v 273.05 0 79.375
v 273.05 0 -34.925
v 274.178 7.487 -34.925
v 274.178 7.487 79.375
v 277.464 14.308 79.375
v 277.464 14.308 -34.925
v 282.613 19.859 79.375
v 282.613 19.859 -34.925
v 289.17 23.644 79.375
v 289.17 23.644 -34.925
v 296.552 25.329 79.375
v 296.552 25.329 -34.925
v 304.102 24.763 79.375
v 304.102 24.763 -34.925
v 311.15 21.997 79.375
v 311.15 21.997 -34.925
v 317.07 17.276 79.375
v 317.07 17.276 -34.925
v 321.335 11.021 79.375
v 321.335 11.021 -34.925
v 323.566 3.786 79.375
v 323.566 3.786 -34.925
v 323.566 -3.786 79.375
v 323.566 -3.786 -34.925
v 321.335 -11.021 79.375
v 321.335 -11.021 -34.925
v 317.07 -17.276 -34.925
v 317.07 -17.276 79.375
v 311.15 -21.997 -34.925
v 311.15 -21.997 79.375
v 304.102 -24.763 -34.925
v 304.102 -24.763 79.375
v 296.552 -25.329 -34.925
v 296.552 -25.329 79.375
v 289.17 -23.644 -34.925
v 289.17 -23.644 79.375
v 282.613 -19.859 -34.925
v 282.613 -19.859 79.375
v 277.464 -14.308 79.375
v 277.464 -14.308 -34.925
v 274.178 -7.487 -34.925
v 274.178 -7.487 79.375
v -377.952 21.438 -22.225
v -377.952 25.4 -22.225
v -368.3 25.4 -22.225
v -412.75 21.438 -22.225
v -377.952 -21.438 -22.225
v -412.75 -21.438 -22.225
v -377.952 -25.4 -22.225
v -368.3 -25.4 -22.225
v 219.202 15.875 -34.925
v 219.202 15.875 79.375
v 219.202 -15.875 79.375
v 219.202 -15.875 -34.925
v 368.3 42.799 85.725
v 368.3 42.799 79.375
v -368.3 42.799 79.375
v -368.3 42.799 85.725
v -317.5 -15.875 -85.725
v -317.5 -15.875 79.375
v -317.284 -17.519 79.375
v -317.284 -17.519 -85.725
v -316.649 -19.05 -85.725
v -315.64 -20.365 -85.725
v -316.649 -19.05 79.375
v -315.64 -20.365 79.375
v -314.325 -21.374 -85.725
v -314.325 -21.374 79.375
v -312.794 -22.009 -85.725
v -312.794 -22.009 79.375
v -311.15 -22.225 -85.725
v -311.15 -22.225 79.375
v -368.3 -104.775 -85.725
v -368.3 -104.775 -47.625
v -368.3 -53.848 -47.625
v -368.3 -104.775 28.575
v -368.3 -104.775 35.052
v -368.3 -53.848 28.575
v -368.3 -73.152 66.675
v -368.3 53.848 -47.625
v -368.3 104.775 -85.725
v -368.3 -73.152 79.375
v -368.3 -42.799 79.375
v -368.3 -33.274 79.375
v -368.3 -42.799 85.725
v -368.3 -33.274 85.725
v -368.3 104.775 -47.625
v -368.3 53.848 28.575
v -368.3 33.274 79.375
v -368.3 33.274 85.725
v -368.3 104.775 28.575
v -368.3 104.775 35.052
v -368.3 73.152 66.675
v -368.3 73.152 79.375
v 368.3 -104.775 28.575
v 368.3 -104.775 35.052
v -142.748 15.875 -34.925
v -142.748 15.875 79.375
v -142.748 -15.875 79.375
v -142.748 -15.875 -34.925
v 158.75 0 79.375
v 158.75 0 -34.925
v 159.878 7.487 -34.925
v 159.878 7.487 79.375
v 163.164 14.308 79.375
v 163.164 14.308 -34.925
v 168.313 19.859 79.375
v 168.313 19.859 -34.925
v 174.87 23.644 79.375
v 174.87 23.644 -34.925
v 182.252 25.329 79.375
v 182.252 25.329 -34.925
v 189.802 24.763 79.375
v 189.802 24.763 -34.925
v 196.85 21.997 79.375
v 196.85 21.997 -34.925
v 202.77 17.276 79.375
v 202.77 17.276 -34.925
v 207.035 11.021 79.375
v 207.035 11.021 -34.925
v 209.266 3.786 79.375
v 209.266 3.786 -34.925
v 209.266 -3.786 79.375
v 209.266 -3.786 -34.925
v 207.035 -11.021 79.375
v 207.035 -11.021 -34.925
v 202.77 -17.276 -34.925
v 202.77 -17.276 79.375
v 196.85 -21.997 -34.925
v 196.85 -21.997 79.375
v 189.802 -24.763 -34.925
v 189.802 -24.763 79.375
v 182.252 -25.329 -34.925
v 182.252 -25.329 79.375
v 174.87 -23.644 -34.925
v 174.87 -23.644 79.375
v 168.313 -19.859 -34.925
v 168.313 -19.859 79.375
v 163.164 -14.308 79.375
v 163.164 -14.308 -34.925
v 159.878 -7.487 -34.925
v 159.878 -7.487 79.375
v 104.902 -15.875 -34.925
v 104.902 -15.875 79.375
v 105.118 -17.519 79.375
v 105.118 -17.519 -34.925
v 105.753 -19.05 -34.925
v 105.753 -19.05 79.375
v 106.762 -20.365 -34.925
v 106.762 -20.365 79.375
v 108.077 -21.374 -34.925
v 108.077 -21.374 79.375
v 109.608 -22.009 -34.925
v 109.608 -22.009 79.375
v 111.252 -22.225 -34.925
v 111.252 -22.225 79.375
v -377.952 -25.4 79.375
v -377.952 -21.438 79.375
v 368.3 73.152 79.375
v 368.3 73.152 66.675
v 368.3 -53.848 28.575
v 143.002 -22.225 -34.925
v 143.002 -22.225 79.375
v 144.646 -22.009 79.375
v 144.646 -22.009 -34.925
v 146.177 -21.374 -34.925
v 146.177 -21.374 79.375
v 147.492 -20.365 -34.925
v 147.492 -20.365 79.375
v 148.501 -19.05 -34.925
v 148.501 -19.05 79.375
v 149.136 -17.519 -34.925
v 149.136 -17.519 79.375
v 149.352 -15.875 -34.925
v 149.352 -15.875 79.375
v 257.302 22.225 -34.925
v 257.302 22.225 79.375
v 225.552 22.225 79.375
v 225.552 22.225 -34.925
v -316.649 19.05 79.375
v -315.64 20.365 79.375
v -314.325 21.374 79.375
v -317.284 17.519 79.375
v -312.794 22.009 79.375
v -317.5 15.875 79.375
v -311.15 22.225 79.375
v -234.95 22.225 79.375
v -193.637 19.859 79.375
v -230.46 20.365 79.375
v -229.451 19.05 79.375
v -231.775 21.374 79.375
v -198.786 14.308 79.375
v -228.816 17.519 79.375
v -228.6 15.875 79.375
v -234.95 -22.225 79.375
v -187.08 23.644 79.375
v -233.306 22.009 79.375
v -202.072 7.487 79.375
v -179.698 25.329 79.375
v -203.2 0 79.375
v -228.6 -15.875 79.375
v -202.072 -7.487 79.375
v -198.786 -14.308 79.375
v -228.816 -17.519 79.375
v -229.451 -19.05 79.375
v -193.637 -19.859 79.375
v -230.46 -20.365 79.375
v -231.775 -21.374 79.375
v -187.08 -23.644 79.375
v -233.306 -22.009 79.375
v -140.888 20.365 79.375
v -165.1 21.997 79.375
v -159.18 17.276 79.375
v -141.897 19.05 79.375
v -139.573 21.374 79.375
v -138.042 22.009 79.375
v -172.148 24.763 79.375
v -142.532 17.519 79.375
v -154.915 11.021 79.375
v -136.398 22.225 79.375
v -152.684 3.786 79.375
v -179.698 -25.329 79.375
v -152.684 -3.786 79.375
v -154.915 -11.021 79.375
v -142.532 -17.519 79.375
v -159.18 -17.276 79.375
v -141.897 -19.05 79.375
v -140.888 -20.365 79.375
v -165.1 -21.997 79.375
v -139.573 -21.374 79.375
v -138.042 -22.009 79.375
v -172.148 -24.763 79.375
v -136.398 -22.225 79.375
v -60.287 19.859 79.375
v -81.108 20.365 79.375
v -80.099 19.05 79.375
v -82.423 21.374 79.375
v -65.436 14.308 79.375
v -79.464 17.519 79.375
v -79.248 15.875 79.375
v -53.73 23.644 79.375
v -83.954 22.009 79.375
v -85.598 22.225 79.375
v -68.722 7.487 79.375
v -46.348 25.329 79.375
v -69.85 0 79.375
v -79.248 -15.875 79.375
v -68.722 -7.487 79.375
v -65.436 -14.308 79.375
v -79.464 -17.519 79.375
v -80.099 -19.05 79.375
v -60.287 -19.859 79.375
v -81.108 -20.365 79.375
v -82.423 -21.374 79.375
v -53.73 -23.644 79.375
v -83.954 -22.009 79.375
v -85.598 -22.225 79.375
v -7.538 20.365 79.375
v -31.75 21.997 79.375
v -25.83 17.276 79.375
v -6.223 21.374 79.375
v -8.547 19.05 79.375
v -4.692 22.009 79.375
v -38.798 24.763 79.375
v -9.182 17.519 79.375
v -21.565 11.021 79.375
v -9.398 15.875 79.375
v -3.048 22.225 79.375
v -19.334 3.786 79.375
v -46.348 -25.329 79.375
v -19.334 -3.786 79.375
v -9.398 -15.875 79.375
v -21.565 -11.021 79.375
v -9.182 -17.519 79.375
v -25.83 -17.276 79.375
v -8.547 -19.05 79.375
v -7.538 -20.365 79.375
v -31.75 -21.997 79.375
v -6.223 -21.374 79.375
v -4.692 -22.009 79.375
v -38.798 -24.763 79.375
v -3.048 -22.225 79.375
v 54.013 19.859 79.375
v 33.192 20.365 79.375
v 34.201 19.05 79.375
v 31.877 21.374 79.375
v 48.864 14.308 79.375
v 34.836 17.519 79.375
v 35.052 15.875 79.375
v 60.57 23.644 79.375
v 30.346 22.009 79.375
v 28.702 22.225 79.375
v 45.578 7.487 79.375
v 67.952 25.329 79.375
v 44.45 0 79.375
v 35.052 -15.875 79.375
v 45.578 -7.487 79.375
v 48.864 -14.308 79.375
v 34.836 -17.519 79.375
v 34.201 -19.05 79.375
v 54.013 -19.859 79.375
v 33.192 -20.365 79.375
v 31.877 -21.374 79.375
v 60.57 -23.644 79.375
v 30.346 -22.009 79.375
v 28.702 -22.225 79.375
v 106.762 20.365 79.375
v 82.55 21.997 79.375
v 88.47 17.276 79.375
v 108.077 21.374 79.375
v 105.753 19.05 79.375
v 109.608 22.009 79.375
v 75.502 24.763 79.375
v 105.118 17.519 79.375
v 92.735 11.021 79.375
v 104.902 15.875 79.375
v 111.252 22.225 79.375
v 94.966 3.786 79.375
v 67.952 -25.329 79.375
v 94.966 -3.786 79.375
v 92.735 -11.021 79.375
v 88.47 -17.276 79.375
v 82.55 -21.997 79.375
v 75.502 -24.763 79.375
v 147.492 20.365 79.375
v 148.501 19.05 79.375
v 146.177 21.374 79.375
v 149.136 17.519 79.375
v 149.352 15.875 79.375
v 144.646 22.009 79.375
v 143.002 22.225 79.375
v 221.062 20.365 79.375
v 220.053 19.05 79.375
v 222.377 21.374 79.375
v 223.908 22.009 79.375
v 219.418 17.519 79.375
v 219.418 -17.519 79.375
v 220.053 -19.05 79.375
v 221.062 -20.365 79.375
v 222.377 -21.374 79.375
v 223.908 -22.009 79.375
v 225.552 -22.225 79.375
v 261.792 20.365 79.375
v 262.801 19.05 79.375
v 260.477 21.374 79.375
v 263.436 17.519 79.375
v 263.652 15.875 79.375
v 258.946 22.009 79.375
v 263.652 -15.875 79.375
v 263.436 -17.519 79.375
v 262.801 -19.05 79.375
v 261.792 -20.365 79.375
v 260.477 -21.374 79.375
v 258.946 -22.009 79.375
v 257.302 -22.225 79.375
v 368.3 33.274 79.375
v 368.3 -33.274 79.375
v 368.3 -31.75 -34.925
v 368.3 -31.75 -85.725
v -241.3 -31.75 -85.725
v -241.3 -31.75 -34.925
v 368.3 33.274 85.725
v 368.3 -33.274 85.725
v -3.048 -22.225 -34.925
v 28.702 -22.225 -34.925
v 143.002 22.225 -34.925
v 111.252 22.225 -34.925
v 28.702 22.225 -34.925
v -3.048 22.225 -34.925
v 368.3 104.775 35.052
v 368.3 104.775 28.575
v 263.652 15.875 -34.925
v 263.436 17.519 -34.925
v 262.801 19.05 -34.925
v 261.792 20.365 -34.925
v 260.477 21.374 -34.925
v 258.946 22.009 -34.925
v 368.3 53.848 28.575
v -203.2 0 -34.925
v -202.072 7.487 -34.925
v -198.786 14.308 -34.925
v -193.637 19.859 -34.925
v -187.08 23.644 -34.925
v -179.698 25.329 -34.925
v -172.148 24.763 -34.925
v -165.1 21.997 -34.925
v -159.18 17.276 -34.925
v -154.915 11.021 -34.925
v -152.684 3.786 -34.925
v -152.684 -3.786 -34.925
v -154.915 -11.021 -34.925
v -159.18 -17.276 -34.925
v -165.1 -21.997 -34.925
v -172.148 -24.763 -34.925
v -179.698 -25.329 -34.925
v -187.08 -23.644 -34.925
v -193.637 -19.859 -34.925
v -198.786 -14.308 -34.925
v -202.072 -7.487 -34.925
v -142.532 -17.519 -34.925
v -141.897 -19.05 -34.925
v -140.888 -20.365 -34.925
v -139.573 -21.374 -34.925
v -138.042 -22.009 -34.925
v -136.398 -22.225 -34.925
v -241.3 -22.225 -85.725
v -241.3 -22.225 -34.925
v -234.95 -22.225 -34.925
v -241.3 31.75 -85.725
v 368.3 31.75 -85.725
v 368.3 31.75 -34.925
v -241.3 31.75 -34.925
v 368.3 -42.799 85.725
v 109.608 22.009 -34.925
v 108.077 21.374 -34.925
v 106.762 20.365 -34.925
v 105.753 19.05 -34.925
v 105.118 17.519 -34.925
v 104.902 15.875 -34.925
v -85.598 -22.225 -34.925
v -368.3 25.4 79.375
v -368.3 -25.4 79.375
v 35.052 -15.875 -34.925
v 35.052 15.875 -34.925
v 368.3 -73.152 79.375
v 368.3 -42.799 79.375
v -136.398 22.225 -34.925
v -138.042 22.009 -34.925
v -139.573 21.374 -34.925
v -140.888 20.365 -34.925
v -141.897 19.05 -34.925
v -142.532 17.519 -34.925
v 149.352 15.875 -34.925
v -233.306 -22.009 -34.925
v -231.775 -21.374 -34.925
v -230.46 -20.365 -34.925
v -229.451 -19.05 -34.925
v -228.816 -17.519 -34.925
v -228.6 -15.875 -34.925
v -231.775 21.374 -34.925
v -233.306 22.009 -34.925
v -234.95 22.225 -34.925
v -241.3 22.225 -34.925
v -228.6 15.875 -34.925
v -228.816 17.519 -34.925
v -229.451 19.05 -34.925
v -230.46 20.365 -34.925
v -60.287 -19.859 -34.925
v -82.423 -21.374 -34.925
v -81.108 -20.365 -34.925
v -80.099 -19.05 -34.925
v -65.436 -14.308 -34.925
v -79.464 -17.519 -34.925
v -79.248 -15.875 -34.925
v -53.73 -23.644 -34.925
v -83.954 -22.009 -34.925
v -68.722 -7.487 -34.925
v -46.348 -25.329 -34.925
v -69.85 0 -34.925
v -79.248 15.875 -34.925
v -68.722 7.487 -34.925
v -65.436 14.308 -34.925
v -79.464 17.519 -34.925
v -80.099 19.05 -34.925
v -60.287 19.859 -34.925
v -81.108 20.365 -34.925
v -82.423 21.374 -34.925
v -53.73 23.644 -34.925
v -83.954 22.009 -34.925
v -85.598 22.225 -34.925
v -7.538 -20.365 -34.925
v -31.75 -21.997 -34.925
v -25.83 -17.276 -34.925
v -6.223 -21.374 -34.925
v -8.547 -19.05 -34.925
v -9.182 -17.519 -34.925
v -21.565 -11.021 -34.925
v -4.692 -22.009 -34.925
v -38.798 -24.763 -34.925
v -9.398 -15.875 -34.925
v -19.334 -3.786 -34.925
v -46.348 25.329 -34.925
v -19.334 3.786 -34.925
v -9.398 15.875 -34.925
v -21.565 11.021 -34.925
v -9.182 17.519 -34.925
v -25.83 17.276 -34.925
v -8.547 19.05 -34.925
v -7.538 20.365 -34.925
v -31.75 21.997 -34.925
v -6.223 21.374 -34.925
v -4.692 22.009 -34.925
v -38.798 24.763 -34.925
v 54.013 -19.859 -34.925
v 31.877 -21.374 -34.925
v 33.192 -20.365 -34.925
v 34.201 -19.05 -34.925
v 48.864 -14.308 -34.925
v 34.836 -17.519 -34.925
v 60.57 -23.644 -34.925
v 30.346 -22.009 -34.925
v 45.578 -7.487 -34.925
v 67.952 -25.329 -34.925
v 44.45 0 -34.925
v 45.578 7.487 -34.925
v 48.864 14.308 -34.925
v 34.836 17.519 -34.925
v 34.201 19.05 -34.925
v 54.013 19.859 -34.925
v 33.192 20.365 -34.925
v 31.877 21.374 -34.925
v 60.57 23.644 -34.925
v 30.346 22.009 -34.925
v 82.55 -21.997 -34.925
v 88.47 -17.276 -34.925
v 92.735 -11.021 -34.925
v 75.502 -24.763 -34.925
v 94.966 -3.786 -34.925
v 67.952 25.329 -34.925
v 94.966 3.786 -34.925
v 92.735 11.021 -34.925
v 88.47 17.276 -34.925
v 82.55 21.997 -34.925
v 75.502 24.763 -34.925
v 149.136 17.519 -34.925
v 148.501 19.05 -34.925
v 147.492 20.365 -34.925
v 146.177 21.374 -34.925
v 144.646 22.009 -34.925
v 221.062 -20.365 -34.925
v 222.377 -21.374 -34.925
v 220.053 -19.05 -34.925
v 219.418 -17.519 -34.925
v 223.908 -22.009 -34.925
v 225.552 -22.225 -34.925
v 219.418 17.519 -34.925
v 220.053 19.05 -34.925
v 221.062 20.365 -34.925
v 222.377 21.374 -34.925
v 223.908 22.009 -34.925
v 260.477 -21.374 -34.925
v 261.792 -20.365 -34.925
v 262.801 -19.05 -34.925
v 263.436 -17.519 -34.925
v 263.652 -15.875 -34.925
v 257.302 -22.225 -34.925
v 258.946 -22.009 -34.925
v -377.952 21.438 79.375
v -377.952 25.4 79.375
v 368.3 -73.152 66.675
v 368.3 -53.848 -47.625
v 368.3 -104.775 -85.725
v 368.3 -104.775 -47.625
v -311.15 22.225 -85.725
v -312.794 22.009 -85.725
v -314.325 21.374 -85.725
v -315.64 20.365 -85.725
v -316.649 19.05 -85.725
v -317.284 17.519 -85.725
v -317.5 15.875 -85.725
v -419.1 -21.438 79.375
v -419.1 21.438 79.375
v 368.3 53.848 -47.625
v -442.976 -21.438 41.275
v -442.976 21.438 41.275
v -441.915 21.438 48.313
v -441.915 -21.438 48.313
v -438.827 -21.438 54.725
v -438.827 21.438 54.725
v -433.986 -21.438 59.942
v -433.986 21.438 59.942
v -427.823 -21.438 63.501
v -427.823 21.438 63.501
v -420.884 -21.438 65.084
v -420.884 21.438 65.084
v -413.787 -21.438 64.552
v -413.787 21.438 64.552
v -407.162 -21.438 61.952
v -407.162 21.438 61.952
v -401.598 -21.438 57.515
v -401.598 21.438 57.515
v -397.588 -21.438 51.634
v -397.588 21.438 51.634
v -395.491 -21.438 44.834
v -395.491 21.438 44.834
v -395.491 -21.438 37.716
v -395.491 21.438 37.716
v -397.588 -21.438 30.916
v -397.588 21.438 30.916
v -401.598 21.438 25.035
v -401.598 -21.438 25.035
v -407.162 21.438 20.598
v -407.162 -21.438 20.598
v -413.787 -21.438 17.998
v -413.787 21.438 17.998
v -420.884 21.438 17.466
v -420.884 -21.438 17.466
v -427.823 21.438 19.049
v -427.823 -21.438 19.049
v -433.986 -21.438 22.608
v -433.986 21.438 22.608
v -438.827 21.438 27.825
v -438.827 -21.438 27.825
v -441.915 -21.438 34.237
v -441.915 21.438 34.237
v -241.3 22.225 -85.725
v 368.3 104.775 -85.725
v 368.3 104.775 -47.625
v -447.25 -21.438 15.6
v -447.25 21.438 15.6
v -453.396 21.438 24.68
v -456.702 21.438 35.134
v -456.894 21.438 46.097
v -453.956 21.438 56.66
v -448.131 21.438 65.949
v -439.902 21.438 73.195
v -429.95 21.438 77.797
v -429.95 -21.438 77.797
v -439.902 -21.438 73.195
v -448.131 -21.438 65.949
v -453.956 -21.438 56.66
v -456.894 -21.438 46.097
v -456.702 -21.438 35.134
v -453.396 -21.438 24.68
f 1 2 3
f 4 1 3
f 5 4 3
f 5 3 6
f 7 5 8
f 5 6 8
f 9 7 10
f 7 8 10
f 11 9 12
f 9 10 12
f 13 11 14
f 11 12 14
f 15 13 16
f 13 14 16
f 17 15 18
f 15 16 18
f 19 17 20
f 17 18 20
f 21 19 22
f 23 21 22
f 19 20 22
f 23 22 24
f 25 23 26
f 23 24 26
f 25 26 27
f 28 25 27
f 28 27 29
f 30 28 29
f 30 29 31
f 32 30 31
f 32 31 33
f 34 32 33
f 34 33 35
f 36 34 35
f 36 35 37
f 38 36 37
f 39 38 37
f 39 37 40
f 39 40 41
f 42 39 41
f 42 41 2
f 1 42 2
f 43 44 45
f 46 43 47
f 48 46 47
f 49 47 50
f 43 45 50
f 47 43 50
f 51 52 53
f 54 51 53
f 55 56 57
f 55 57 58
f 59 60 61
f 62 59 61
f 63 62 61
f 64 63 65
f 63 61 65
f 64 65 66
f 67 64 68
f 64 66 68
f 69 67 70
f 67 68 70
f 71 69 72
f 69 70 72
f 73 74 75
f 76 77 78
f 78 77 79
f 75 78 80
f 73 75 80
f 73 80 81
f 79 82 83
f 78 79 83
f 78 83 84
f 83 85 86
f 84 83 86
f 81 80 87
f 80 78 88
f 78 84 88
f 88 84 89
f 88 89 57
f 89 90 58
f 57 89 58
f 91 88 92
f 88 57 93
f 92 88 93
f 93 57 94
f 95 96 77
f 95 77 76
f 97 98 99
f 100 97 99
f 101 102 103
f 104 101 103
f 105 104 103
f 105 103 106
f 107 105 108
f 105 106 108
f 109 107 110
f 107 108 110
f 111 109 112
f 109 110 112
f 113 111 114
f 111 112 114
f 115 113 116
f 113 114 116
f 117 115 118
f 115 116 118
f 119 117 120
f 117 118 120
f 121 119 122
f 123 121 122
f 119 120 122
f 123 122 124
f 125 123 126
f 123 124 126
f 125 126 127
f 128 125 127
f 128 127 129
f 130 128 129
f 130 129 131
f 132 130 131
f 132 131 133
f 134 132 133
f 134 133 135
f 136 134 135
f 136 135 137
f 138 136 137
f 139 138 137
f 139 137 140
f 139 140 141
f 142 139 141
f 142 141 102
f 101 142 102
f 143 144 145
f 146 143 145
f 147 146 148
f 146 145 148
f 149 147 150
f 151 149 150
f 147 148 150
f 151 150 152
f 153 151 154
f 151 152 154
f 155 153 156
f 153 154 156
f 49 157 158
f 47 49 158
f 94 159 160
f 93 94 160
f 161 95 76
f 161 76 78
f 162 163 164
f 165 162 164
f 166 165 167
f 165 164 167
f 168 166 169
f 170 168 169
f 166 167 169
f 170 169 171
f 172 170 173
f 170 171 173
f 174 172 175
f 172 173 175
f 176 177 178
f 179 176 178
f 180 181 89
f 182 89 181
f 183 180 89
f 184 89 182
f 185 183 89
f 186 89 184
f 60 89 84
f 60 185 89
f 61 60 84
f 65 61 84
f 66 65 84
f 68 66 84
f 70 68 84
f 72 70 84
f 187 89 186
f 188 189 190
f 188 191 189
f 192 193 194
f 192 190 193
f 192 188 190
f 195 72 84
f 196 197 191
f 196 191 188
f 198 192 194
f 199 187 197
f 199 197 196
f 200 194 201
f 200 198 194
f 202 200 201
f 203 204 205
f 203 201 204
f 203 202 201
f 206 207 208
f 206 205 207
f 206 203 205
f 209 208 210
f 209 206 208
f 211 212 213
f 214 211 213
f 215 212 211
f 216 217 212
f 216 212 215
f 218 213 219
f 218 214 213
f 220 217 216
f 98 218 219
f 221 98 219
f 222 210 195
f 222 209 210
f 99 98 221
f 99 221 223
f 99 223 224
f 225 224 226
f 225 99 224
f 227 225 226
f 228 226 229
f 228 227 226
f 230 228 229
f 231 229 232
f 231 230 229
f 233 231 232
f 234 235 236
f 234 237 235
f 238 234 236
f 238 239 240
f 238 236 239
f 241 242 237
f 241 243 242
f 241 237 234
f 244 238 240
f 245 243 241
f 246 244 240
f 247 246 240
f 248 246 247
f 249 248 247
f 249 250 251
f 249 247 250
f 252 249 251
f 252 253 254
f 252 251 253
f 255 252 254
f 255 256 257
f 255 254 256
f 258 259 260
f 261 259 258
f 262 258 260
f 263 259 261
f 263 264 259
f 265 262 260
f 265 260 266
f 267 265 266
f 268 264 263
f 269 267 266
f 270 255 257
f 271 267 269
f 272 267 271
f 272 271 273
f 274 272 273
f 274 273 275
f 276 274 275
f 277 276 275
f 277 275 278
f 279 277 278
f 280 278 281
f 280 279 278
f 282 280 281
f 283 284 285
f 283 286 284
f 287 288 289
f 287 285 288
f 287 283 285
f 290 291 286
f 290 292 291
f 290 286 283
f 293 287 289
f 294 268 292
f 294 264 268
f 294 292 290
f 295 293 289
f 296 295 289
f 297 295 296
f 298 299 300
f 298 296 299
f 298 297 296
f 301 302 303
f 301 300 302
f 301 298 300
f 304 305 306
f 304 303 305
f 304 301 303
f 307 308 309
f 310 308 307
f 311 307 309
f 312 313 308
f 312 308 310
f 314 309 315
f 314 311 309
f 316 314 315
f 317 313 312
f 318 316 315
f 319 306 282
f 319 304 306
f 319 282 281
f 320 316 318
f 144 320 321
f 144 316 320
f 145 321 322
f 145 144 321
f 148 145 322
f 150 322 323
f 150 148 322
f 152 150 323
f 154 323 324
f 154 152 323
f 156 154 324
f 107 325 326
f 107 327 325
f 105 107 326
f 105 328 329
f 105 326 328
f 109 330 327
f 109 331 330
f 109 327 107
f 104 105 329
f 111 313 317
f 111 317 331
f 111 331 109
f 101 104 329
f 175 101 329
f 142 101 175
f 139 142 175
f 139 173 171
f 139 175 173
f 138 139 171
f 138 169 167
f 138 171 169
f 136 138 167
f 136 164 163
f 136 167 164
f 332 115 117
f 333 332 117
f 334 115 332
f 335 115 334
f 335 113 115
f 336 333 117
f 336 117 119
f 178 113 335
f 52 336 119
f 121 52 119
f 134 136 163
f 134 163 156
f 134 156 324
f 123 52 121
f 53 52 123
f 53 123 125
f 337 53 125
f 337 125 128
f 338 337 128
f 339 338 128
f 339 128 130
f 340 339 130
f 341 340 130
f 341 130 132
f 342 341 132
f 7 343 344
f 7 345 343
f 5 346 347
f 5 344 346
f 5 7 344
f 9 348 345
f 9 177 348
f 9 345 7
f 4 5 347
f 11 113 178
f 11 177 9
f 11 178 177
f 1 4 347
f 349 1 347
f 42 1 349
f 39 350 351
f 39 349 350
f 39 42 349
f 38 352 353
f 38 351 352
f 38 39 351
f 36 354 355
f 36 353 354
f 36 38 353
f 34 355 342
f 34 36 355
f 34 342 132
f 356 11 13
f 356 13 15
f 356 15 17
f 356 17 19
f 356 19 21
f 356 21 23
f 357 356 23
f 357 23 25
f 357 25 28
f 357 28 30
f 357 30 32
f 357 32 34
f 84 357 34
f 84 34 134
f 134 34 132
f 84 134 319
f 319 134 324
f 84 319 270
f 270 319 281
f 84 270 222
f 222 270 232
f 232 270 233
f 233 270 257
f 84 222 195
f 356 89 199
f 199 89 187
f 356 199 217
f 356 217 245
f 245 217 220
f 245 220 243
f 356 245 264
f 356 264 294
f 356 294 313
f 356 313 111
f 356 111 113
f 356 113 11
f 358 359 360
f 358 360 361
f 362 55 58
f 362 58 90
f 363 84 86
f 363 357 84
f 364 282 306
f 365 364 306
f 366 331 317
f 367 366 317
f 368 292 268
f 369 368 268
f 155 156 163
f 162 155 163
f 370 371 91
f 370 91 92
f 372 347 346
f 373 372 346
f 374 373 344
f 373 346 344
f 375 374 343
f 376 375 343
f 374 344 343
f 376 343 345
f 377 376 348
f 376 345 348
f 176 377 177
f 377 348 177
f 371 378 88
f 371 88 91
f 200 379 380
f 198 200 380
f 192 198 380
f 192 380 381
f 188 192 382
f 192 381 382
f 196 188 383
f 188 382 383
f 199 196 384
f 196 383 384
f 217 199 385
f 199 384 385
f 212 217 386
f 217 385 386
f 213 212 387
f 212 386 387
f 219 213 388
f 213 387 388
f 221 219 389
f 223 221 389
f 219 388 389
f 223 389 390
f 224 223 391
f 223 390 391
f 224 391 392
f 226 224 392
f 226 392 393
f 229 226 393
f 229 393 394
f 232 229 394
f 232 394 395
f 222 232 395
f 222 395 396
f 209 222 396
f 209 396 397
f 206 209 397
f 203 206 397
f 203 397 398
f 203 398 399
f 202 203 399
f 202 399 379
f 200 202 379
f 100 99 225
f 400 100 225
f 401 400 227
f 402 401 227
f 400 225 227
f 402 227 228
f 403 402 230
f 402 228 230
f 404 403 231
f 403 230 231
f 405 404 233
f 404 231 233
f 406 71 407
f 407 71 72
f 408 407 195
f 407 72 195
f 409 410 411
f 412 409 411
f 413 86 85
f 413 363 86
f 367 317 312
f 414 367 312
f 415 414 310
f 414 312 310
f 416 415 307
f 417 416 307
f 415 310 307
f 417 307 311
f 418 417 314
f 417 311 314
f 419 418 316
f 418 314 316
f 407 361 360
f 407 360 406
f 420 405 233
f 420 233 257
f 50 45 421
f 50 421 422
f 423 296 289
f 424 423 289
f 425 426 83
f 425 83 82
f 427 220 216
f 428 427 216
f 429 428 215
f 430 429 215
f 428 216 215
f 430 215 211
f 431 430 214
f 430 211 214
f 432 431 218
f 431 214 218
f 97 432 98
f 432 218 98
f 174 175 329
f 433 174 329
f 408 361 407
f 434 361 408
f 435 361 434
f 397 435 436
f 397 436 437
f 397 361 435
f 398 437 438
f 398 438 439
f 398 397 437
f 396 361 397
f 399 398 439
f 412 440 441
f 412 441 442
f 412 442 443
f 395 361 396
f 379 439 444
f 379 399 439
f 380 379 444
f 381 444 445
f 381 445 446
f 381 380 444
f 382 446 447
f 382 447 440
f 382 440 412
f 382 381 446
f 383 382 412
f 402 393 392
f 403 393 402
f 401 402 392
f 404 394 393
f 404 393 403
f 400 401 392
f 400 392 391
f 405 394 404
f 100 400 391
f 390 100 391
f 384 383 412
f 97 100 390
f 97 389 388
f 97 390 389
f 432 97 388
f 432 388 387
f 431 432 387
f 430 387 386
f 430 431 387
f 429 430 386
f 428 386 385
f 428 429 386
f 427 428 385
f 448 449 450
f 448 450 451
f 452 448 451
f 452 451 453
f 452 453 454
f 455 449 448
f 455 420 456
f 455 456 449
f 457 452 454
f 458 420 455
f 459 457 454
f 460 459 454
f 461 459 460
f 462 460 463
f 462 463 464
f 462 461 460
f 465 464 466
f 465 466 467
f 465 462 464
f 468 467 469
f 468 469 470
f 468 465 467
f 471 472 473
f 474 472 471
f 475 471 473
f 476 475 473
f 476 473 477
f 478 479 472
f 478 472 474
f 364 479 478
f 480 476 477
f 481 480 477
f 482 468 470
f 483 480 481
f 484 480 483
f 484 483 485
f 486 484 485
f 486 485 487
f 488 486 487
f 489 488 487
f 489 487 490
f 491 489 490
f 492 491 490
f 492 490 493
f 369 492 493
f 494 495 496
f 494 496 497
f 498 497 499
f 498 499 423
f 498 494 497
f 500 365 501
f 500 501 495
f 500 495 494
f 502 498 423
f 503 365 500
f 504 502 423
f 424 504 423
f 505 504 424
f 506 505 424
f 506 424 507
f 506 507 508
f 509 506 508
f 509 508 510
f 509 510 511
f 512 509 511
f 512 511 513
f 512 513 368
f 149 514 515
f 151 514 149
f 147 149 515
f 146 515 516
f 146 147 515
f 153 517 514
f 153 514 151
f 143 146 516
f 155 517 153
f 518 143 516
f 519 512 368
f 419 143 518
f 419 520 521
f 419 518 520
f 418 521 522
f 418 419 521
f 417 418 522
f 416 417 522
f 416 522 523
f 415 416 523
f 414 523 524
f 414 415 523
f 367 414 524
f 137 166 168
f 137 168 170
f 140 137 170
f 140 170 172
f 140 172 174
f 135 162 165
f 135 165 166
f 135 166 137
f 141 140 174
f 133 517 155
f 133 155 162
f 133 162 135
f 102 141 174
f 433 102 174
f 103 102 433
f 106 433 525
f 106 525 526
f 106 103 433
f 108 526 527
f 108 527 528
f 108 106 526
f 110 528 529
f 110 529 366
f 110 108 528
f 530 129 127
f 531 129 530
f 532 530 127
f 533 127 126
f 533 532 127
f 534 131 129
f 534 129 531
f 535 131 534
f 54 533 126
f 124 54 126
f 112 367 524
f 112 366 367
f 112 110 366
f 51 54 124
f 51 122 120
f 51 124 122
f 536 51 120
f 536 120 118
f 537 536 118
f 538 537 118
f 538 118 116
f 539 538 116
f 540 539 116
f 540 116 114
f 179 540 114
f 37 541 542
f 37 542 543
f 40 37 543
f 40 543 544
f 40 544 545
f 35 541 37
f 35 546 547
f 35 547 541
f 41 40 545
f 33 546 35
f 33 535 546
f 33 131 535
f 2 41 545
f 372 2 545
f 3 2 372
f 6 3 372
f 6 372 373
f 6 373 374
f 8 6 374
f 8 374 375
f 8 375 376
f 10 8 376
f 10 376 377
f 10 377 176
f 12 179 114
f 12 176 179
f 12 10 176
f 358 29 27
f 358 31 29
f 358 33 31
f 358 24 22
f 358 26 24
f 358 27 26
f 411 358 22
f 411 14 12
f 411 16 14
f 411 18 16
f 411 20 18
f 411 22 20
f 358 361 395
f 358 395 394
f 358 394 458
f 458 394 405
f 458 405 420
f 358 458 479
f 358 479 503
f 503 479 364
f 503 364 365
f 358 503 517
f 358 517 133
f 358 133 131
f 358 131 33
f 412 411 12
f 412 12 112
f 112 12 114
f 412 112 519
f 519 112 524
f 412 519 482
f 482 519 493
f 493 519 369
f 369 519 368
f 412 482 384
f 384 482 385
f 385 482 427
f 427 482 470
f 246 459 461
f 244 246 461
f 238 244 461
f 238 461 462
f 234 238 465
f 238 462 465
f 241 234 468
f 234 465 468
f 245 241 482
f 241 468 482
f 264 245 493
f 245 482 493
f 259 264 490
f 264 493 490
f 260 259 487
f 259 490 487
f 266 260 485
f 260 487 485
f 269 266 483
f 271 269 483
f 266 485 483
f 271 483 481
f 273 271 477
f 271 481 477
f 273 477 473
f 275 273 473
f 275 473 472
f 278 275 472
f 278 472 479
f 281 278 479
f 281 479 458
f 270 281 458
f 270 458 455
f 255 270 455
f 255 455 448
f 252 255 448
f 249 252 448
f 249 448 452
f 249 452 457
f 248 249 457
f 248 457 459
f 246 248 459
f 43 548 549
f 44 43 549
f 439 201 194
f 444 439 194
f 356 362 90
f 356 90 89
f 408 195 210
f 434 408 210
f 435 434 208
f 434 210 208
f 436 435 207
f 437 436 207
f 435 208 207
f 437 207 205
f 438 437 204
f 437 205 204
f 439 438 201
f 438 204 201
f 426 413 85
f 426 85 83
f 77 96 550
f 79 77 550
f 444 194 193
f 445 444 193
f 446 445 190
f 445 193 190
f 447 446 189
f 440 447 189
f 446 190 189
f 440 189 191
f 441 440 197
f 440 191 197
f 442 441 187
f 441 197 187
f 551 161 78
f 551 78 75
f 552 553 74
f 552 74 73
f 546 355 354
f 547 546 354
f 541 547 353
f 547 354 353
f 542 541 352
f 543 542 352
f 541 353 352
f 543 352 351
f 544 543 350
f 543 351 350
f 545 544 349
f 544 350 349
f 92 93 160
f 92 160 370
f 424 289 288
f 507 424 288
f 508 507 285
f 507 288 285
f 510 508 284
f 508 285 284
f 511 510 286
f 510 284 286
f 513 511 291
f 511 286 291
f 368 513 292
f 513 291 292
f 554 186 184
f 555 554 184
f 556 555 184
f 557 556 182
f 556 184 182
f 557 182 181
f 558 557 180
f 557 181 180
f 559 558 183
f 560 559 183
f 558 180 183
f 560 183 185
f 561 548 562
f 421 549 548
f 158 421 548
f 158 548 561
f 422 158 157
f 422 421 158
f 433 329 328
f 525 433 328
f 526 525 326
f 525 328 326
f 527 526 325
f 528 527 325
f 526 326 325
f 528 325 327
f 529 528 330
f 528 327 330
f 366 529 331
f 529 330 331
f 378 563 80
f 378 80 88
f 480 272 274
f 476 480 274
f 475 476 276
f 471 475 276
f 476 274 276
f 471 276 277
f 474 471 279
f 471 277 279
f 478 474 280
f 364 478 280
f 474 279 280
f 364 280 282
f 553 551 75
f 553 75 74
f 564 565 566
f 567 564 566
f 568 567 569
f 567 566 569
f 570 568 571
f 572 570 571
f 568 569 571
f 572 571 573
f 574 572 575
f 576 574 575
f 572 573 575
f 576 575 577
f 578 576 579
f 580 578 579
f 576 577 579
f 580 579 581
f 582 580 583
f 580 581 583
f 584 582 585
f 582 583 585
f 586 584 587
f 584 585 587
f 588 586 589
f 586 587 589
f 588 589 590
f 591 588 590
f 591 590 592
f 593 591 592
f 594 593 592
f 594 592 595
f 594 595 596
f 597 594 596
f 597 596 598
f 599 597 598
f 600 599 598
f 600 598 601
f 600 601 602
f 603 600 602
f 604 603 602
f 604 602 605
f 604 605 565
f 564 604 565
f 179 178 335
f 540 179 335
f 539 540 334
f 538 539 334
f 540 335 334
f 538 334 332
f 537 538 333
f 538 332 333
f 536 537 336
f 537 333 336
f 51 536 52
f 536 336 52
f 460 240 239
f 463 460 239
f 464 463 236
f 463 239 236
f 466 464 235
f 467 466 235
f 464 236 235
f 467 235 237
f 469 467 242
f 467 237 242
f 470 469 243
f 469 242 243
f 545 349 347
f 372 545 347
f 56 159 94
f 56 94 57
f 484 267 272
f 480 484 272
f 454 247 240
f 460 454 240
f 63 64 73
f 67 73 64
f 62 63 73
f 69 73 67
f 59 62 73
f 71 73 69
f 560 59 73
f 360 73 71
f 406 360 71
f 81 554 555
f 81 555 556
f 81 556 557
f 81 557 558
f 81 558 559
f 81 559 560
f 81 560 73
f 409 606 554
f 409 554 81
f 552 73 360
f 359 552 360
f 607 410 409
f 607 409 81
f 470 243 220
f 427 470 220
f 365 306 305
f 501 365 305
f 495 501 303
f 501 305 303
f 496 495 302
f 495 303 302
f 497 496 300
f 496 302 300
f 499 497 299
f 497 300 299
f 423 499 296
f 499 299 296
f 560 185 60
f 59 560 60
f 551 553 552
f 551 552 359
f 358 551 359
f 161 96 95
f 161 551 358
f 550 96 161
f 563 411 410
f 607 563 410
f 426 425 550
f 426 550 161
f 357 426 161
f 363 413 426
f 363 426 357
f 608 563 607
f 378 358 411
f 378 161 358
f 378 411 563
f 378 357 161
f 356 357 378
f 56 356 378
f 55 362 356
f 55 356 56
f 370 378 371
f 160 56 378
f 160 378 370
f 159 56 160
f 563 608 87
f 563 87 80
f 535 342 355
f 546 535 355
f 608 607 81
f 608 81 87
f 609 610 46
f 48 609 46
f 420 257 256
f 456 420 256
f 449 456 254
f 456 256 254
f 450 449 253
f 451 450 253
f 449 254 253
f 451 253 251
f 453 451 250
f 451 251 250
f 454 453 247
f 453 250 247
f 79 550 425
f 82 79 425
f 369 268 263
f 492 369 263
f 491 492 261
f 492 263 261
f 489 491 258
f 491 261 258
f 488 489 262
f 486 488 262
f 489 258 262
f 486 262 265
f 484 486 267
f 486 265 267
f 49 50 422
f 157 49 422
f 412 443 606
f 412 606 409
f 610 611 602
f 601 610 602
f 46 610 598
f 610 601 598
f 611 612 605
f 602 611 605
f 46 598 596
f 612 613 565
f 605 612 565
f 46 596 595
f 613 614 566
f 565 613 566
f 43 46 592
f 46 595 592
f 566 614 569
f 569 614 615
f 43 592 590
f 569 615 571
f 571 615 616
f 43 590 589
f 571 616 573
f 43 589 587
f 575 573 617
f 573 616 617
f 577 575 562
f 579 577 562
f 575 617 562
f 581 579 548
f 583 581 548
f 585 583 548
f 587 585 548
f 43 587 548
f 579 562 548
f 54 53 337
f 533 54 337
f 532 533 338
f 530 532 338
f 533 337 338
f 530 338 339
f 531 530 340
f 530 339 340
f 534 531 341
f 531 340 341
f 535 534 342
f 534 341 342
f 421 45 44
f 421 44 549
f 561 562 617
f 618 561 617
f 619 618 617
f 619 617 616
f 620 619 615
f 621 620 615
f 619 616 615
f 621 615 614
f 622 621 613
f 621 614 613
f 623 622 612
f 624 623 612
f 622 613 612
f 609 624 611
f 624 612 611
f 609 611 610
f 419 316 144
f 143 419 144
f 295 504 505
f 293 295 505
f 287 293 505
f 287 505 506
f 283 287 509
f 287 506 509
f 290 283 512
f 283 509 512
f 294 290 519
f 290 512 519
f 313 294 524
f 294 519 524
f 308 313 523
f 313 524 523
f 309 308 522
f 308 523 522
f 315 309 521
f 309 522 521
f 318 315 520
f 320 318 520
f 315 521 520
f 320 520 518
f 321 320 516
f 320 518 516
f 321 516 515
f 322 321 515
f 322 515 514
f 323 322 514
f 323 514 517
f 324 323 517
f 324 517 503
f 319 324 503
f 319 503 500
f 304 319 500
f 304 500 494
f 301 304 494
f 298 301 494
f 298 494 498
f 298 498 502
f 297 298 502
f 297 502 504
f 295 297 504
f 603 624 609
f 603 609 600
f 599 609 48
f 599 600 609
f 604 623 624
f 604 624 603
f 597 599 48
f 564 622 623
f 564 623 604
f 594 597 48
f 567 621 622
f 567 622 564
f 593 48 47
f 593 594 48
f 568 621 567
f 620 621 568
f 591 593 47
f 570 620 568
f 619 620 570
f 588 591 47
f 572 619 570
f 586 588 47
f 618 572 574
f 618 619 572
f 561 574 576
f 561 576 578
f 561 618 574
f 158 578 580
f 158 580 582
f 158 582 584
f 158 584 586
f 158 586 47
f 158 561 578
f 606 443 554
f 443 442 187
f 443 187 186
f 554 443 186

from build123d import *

# Parameters (mm, degrees)
F1_DEPTH  = 368.3
F2_W      = 63.5
F2_H      = 101.6
F3_DEPTH  = 609.6
F5_D      = 50.8
F7_DEPTH  = 165.101
F9_DEPTH  = 736.601
F10_W     = 50.8
F10_H     = 101.6
F11_DEPTH = 88.9
F12_W     = 79.248
F12_H     = 3.9624
F13_DEPTH = 165.101
F14_R     = 23.876
F15_DEPTH = 126.2136
F17_DEPTH = 126.2136


with BuildPart() as f1:
    # F0 (on Right) → F1 (new body, symmetric)
    with BuildSketch(Plane.YZ):
        Polygon((-33.274, 85.725), (-42.799, 85.725), (-42.799, 79.375), (-104.775, 79.375), (-104.775, 28.575), (-53.848, 28.575), (-53.848, -47.625), (-104.775, -47.625), (-104.775, -85.725), (104.775, -85.725), (104.775, -47.625), (53.848, -47.625), (53.848, 28.575), (104.775, 28.575), (104.775, 79.375), (42.799, 79.375), (42.799, 85.725), (33.274, 85.725), (33.274, 79.375), (0, 79.375), (-33.274, 79.375), align=None)
    extrude(amount=F1_DEPTH, both=True)

    # F2 (on face) → F3 (cut)
    with BuildSketch(Plane.YZ.offset(368.3)):
        with Locations((0, -85.725)):
            Rectangle(F2_W, F2_H)
    extrude(amount=-F3_DEPTH, mode=Mode.SUBTRACT)

    # F5 (through all)
    with Locations(Plane.XY.offset(79.375)):
        with Locations((-177.8, 0), (-44.45, 0), (69.85, 0), (184.15, 0), (298.45, 0)):
            Hole(F5_D / 2)

    # F6 (on face) → F7 (cut, through all)
    with BuildSketch(Plane.XY.offset(79.375)):
        with BuildLine():
            Line((257.302, 22.225), (225.552, 22.225))
            ThreePointArc((225.552, 22.225), (221.061872, 20.365128), (219.202, 15.875))
            Line((219.202, 15.875), (219.202, -15.875))
            ThreePointArc((219.202, -15.875), (221.061872, -20.365128), (225.552, -22.225))
            Line((225.552, -22.225), (257.302, -22.225))
            ThreePointArc((257.302, -22.225), (261.792128, -20.365128), (263.652, -15.875))
            Line((263.652, -15.875), (263.652, 15.875))
            ThreePointArc((263.652, 15.875), (261.792128, 20.365128), (257.302, 22.225))
        make_face()
        with BuildLine():
            Line((149.352, -15.875), (149.352, 15.875))
            ThreePointArc((149.352, 15.875), (147.492128, 20.365128), (143.002, 22.225))
            Line((143.002, 22.225), (111.252, 22.225))
            ThreePointArc((111.252, 22.225), (106.761872, 20.365128), (104.902, 15.875))
            Line((104.902, 15.875), (104.902, -15.875))
            ThreePointArc((104.902, -15.875), (106.761872, -20.365128), (111.252, -22.225))
            Line((111.252, -22.225), (143.002, -22.225))
            ThreePointArc((143.002, -22.225), (147.492128, -20.365128), (149.352, -15.875))
        make_face()
        with BuildLine():
            Line((35.052, -15.875), (35.052, 15.875))
            ThreePointArc((35.052, 15.875), (33.192128, 20.365128), (28.702, 22.225))
            Line((28.702, 22.225), (-3.048, 22.225))
            ThreePointArc((-3.048, 22.225), (-7.538128, 20.365128), (-9.398, 15.875))
            Line((-9.398, 15.875), (-9.398, -15.875))
            ThreePointArc((-9.398, -15.875), (-7.538128, -20.365128), (-3.048, -22.225))
            Line((-3.048, -22.225), (28.702, -22.225))
            ThreePointArc((28.702, -22.225), (33.192128, -20.365128), (35.052, -15.875))
        make_face()
        with BuildLine():
            Line((-79.248, -15.875), (-79.248, 15.875))
            ThreePointArc((-79.248, 15.875), (-81.107872, 20.365128), (-85.598, 22.225))
            Line((-85.598, 22.225), (-136.398, 22.225))
            ThreePointArc((-136.398, 22.225), (-140.888128, 20.365128), (-142.748, 15.875))
            Line((-142.748, 15.875), (-142.748, -15.875))
            ThreePointArc((-142.748, -15.875), (-140.888128, -20.365128), (-136.398, -22.225))
            Line((-136.398, -22.225), (-85.598, -22.225))
            ThreePointArc((-85.598, -22.225), (-81.107872, -20.365128), (-79.248, -15.875))
        make_face()
        with BuildLine():
            Line((-228.6, -15.875), (-228.6, 15.875))
            ThreePointArc((-228.6, 15.875), (-230.459872, 20.365128), (-234.95, 22.225))
            Line((-234.95, 22.225), (-311.15, 22.225))
            ThreePointArc((-311.15, 22.225), (-315.640128, 20.365128), (-317.5, 15.875))
            Line((-317.5, 15.875), (-317.5, -15.875))
            ThreePointArc((-317.5, -15.875), (-315.640128, -20.365128), (-311.15, -22.225))
            Line((-311.15, -22.225), (-234.95, -22.225))
            ThreePointArc((-234.95, -22.225), (-230.459872, -20.365128), (-228.6, -15.875))
        make_face()
    extrude(amount=-F7_DEPTH, mode=Mode.SUBTRACT)

    # F8 (on face) → F9 (cut, through all)
    with BuildSketch(Plane.YZ.offset(368.3)):
        Polygon((-119.211055, 20.615945), (-73.152, 66.675), (-73.152, 82.745112), (-119.211055, 82.745112), align=None)
        Polygon((73.152, 82.745112), (73.152, 66.675), (119.211055, 20.615945), (119.211055, 82.745112), align=None)
    extrude(amount=-F9_DEPTH, mode=Mode.SUBTRACT)


with BuildPart() as f11:
    # F10 (on face) → F11 (new body)
    with BuildSketch(Plane(origin=(-368.3, 0, 0), x_dir=(0, -1, 0), z_dir=(-1, 0, 0))):
        with Locations((0, 28.575)):
            Rectangle(F10_W, F10_H)
    extrude(amount=F11_DEPTH)

    # F12 (on face) → F13 (cut, through all)
    with BuildSketch(Plane.XY.offset(79.375)):
        with Locations((-417.576, -23.4188)):
            Rectangle(F12_W, F12_H)
        with Locations((-417.576, 23.4188)):
            Rectangle(F12_W, F12_H)
    extrude(amount=-F13_DEPTH, mode=Mode.SUBTRACT)

    # F14 (on face) → F15 (cut, through all)
    with BuildSketch(Plane(origin=(0, 21.4376, 0), x_dir=(-1, 0, 0), z_dir=(0, 1, 0))):
        with Locations((419.1, 41.275)):
            Circle(F14_R)
    extrude(amount=-F15_DEPTH, mode=Mode.SUBTRACT)

    # F16 (on face) → F17 (cut, through all)
    with BuildSketch(Plane(origin=(0, 21.4376, 0), x_dir=(-1, 0, 0), z_dir=(0, 1, 0))):
        with BuildLine():
            ThreePointArc((419.1, 79.375), (453.955605, 56.659954), (447.249705, 15.60003))
            Line((447.249705, 15.60003), (412.75, -22.225))
            Line((412.75, -22.225), (412.75, -37.565868))
            Line((412.75, -37.565868), (486.452013, -37.565868))
            Line((486.452013, -37.565868), (486.452013, 99.688865))
            Line((486.452013, 99.688865), (419.1, 99.688865))
            Line((419.1, 99.688865), (419.1, 79.375))
        make_face()
    extrude(amount=-F17_DEPTH, mode=Mode.SUBTRACT)


solid = Compound([f1.part, f11.part])
